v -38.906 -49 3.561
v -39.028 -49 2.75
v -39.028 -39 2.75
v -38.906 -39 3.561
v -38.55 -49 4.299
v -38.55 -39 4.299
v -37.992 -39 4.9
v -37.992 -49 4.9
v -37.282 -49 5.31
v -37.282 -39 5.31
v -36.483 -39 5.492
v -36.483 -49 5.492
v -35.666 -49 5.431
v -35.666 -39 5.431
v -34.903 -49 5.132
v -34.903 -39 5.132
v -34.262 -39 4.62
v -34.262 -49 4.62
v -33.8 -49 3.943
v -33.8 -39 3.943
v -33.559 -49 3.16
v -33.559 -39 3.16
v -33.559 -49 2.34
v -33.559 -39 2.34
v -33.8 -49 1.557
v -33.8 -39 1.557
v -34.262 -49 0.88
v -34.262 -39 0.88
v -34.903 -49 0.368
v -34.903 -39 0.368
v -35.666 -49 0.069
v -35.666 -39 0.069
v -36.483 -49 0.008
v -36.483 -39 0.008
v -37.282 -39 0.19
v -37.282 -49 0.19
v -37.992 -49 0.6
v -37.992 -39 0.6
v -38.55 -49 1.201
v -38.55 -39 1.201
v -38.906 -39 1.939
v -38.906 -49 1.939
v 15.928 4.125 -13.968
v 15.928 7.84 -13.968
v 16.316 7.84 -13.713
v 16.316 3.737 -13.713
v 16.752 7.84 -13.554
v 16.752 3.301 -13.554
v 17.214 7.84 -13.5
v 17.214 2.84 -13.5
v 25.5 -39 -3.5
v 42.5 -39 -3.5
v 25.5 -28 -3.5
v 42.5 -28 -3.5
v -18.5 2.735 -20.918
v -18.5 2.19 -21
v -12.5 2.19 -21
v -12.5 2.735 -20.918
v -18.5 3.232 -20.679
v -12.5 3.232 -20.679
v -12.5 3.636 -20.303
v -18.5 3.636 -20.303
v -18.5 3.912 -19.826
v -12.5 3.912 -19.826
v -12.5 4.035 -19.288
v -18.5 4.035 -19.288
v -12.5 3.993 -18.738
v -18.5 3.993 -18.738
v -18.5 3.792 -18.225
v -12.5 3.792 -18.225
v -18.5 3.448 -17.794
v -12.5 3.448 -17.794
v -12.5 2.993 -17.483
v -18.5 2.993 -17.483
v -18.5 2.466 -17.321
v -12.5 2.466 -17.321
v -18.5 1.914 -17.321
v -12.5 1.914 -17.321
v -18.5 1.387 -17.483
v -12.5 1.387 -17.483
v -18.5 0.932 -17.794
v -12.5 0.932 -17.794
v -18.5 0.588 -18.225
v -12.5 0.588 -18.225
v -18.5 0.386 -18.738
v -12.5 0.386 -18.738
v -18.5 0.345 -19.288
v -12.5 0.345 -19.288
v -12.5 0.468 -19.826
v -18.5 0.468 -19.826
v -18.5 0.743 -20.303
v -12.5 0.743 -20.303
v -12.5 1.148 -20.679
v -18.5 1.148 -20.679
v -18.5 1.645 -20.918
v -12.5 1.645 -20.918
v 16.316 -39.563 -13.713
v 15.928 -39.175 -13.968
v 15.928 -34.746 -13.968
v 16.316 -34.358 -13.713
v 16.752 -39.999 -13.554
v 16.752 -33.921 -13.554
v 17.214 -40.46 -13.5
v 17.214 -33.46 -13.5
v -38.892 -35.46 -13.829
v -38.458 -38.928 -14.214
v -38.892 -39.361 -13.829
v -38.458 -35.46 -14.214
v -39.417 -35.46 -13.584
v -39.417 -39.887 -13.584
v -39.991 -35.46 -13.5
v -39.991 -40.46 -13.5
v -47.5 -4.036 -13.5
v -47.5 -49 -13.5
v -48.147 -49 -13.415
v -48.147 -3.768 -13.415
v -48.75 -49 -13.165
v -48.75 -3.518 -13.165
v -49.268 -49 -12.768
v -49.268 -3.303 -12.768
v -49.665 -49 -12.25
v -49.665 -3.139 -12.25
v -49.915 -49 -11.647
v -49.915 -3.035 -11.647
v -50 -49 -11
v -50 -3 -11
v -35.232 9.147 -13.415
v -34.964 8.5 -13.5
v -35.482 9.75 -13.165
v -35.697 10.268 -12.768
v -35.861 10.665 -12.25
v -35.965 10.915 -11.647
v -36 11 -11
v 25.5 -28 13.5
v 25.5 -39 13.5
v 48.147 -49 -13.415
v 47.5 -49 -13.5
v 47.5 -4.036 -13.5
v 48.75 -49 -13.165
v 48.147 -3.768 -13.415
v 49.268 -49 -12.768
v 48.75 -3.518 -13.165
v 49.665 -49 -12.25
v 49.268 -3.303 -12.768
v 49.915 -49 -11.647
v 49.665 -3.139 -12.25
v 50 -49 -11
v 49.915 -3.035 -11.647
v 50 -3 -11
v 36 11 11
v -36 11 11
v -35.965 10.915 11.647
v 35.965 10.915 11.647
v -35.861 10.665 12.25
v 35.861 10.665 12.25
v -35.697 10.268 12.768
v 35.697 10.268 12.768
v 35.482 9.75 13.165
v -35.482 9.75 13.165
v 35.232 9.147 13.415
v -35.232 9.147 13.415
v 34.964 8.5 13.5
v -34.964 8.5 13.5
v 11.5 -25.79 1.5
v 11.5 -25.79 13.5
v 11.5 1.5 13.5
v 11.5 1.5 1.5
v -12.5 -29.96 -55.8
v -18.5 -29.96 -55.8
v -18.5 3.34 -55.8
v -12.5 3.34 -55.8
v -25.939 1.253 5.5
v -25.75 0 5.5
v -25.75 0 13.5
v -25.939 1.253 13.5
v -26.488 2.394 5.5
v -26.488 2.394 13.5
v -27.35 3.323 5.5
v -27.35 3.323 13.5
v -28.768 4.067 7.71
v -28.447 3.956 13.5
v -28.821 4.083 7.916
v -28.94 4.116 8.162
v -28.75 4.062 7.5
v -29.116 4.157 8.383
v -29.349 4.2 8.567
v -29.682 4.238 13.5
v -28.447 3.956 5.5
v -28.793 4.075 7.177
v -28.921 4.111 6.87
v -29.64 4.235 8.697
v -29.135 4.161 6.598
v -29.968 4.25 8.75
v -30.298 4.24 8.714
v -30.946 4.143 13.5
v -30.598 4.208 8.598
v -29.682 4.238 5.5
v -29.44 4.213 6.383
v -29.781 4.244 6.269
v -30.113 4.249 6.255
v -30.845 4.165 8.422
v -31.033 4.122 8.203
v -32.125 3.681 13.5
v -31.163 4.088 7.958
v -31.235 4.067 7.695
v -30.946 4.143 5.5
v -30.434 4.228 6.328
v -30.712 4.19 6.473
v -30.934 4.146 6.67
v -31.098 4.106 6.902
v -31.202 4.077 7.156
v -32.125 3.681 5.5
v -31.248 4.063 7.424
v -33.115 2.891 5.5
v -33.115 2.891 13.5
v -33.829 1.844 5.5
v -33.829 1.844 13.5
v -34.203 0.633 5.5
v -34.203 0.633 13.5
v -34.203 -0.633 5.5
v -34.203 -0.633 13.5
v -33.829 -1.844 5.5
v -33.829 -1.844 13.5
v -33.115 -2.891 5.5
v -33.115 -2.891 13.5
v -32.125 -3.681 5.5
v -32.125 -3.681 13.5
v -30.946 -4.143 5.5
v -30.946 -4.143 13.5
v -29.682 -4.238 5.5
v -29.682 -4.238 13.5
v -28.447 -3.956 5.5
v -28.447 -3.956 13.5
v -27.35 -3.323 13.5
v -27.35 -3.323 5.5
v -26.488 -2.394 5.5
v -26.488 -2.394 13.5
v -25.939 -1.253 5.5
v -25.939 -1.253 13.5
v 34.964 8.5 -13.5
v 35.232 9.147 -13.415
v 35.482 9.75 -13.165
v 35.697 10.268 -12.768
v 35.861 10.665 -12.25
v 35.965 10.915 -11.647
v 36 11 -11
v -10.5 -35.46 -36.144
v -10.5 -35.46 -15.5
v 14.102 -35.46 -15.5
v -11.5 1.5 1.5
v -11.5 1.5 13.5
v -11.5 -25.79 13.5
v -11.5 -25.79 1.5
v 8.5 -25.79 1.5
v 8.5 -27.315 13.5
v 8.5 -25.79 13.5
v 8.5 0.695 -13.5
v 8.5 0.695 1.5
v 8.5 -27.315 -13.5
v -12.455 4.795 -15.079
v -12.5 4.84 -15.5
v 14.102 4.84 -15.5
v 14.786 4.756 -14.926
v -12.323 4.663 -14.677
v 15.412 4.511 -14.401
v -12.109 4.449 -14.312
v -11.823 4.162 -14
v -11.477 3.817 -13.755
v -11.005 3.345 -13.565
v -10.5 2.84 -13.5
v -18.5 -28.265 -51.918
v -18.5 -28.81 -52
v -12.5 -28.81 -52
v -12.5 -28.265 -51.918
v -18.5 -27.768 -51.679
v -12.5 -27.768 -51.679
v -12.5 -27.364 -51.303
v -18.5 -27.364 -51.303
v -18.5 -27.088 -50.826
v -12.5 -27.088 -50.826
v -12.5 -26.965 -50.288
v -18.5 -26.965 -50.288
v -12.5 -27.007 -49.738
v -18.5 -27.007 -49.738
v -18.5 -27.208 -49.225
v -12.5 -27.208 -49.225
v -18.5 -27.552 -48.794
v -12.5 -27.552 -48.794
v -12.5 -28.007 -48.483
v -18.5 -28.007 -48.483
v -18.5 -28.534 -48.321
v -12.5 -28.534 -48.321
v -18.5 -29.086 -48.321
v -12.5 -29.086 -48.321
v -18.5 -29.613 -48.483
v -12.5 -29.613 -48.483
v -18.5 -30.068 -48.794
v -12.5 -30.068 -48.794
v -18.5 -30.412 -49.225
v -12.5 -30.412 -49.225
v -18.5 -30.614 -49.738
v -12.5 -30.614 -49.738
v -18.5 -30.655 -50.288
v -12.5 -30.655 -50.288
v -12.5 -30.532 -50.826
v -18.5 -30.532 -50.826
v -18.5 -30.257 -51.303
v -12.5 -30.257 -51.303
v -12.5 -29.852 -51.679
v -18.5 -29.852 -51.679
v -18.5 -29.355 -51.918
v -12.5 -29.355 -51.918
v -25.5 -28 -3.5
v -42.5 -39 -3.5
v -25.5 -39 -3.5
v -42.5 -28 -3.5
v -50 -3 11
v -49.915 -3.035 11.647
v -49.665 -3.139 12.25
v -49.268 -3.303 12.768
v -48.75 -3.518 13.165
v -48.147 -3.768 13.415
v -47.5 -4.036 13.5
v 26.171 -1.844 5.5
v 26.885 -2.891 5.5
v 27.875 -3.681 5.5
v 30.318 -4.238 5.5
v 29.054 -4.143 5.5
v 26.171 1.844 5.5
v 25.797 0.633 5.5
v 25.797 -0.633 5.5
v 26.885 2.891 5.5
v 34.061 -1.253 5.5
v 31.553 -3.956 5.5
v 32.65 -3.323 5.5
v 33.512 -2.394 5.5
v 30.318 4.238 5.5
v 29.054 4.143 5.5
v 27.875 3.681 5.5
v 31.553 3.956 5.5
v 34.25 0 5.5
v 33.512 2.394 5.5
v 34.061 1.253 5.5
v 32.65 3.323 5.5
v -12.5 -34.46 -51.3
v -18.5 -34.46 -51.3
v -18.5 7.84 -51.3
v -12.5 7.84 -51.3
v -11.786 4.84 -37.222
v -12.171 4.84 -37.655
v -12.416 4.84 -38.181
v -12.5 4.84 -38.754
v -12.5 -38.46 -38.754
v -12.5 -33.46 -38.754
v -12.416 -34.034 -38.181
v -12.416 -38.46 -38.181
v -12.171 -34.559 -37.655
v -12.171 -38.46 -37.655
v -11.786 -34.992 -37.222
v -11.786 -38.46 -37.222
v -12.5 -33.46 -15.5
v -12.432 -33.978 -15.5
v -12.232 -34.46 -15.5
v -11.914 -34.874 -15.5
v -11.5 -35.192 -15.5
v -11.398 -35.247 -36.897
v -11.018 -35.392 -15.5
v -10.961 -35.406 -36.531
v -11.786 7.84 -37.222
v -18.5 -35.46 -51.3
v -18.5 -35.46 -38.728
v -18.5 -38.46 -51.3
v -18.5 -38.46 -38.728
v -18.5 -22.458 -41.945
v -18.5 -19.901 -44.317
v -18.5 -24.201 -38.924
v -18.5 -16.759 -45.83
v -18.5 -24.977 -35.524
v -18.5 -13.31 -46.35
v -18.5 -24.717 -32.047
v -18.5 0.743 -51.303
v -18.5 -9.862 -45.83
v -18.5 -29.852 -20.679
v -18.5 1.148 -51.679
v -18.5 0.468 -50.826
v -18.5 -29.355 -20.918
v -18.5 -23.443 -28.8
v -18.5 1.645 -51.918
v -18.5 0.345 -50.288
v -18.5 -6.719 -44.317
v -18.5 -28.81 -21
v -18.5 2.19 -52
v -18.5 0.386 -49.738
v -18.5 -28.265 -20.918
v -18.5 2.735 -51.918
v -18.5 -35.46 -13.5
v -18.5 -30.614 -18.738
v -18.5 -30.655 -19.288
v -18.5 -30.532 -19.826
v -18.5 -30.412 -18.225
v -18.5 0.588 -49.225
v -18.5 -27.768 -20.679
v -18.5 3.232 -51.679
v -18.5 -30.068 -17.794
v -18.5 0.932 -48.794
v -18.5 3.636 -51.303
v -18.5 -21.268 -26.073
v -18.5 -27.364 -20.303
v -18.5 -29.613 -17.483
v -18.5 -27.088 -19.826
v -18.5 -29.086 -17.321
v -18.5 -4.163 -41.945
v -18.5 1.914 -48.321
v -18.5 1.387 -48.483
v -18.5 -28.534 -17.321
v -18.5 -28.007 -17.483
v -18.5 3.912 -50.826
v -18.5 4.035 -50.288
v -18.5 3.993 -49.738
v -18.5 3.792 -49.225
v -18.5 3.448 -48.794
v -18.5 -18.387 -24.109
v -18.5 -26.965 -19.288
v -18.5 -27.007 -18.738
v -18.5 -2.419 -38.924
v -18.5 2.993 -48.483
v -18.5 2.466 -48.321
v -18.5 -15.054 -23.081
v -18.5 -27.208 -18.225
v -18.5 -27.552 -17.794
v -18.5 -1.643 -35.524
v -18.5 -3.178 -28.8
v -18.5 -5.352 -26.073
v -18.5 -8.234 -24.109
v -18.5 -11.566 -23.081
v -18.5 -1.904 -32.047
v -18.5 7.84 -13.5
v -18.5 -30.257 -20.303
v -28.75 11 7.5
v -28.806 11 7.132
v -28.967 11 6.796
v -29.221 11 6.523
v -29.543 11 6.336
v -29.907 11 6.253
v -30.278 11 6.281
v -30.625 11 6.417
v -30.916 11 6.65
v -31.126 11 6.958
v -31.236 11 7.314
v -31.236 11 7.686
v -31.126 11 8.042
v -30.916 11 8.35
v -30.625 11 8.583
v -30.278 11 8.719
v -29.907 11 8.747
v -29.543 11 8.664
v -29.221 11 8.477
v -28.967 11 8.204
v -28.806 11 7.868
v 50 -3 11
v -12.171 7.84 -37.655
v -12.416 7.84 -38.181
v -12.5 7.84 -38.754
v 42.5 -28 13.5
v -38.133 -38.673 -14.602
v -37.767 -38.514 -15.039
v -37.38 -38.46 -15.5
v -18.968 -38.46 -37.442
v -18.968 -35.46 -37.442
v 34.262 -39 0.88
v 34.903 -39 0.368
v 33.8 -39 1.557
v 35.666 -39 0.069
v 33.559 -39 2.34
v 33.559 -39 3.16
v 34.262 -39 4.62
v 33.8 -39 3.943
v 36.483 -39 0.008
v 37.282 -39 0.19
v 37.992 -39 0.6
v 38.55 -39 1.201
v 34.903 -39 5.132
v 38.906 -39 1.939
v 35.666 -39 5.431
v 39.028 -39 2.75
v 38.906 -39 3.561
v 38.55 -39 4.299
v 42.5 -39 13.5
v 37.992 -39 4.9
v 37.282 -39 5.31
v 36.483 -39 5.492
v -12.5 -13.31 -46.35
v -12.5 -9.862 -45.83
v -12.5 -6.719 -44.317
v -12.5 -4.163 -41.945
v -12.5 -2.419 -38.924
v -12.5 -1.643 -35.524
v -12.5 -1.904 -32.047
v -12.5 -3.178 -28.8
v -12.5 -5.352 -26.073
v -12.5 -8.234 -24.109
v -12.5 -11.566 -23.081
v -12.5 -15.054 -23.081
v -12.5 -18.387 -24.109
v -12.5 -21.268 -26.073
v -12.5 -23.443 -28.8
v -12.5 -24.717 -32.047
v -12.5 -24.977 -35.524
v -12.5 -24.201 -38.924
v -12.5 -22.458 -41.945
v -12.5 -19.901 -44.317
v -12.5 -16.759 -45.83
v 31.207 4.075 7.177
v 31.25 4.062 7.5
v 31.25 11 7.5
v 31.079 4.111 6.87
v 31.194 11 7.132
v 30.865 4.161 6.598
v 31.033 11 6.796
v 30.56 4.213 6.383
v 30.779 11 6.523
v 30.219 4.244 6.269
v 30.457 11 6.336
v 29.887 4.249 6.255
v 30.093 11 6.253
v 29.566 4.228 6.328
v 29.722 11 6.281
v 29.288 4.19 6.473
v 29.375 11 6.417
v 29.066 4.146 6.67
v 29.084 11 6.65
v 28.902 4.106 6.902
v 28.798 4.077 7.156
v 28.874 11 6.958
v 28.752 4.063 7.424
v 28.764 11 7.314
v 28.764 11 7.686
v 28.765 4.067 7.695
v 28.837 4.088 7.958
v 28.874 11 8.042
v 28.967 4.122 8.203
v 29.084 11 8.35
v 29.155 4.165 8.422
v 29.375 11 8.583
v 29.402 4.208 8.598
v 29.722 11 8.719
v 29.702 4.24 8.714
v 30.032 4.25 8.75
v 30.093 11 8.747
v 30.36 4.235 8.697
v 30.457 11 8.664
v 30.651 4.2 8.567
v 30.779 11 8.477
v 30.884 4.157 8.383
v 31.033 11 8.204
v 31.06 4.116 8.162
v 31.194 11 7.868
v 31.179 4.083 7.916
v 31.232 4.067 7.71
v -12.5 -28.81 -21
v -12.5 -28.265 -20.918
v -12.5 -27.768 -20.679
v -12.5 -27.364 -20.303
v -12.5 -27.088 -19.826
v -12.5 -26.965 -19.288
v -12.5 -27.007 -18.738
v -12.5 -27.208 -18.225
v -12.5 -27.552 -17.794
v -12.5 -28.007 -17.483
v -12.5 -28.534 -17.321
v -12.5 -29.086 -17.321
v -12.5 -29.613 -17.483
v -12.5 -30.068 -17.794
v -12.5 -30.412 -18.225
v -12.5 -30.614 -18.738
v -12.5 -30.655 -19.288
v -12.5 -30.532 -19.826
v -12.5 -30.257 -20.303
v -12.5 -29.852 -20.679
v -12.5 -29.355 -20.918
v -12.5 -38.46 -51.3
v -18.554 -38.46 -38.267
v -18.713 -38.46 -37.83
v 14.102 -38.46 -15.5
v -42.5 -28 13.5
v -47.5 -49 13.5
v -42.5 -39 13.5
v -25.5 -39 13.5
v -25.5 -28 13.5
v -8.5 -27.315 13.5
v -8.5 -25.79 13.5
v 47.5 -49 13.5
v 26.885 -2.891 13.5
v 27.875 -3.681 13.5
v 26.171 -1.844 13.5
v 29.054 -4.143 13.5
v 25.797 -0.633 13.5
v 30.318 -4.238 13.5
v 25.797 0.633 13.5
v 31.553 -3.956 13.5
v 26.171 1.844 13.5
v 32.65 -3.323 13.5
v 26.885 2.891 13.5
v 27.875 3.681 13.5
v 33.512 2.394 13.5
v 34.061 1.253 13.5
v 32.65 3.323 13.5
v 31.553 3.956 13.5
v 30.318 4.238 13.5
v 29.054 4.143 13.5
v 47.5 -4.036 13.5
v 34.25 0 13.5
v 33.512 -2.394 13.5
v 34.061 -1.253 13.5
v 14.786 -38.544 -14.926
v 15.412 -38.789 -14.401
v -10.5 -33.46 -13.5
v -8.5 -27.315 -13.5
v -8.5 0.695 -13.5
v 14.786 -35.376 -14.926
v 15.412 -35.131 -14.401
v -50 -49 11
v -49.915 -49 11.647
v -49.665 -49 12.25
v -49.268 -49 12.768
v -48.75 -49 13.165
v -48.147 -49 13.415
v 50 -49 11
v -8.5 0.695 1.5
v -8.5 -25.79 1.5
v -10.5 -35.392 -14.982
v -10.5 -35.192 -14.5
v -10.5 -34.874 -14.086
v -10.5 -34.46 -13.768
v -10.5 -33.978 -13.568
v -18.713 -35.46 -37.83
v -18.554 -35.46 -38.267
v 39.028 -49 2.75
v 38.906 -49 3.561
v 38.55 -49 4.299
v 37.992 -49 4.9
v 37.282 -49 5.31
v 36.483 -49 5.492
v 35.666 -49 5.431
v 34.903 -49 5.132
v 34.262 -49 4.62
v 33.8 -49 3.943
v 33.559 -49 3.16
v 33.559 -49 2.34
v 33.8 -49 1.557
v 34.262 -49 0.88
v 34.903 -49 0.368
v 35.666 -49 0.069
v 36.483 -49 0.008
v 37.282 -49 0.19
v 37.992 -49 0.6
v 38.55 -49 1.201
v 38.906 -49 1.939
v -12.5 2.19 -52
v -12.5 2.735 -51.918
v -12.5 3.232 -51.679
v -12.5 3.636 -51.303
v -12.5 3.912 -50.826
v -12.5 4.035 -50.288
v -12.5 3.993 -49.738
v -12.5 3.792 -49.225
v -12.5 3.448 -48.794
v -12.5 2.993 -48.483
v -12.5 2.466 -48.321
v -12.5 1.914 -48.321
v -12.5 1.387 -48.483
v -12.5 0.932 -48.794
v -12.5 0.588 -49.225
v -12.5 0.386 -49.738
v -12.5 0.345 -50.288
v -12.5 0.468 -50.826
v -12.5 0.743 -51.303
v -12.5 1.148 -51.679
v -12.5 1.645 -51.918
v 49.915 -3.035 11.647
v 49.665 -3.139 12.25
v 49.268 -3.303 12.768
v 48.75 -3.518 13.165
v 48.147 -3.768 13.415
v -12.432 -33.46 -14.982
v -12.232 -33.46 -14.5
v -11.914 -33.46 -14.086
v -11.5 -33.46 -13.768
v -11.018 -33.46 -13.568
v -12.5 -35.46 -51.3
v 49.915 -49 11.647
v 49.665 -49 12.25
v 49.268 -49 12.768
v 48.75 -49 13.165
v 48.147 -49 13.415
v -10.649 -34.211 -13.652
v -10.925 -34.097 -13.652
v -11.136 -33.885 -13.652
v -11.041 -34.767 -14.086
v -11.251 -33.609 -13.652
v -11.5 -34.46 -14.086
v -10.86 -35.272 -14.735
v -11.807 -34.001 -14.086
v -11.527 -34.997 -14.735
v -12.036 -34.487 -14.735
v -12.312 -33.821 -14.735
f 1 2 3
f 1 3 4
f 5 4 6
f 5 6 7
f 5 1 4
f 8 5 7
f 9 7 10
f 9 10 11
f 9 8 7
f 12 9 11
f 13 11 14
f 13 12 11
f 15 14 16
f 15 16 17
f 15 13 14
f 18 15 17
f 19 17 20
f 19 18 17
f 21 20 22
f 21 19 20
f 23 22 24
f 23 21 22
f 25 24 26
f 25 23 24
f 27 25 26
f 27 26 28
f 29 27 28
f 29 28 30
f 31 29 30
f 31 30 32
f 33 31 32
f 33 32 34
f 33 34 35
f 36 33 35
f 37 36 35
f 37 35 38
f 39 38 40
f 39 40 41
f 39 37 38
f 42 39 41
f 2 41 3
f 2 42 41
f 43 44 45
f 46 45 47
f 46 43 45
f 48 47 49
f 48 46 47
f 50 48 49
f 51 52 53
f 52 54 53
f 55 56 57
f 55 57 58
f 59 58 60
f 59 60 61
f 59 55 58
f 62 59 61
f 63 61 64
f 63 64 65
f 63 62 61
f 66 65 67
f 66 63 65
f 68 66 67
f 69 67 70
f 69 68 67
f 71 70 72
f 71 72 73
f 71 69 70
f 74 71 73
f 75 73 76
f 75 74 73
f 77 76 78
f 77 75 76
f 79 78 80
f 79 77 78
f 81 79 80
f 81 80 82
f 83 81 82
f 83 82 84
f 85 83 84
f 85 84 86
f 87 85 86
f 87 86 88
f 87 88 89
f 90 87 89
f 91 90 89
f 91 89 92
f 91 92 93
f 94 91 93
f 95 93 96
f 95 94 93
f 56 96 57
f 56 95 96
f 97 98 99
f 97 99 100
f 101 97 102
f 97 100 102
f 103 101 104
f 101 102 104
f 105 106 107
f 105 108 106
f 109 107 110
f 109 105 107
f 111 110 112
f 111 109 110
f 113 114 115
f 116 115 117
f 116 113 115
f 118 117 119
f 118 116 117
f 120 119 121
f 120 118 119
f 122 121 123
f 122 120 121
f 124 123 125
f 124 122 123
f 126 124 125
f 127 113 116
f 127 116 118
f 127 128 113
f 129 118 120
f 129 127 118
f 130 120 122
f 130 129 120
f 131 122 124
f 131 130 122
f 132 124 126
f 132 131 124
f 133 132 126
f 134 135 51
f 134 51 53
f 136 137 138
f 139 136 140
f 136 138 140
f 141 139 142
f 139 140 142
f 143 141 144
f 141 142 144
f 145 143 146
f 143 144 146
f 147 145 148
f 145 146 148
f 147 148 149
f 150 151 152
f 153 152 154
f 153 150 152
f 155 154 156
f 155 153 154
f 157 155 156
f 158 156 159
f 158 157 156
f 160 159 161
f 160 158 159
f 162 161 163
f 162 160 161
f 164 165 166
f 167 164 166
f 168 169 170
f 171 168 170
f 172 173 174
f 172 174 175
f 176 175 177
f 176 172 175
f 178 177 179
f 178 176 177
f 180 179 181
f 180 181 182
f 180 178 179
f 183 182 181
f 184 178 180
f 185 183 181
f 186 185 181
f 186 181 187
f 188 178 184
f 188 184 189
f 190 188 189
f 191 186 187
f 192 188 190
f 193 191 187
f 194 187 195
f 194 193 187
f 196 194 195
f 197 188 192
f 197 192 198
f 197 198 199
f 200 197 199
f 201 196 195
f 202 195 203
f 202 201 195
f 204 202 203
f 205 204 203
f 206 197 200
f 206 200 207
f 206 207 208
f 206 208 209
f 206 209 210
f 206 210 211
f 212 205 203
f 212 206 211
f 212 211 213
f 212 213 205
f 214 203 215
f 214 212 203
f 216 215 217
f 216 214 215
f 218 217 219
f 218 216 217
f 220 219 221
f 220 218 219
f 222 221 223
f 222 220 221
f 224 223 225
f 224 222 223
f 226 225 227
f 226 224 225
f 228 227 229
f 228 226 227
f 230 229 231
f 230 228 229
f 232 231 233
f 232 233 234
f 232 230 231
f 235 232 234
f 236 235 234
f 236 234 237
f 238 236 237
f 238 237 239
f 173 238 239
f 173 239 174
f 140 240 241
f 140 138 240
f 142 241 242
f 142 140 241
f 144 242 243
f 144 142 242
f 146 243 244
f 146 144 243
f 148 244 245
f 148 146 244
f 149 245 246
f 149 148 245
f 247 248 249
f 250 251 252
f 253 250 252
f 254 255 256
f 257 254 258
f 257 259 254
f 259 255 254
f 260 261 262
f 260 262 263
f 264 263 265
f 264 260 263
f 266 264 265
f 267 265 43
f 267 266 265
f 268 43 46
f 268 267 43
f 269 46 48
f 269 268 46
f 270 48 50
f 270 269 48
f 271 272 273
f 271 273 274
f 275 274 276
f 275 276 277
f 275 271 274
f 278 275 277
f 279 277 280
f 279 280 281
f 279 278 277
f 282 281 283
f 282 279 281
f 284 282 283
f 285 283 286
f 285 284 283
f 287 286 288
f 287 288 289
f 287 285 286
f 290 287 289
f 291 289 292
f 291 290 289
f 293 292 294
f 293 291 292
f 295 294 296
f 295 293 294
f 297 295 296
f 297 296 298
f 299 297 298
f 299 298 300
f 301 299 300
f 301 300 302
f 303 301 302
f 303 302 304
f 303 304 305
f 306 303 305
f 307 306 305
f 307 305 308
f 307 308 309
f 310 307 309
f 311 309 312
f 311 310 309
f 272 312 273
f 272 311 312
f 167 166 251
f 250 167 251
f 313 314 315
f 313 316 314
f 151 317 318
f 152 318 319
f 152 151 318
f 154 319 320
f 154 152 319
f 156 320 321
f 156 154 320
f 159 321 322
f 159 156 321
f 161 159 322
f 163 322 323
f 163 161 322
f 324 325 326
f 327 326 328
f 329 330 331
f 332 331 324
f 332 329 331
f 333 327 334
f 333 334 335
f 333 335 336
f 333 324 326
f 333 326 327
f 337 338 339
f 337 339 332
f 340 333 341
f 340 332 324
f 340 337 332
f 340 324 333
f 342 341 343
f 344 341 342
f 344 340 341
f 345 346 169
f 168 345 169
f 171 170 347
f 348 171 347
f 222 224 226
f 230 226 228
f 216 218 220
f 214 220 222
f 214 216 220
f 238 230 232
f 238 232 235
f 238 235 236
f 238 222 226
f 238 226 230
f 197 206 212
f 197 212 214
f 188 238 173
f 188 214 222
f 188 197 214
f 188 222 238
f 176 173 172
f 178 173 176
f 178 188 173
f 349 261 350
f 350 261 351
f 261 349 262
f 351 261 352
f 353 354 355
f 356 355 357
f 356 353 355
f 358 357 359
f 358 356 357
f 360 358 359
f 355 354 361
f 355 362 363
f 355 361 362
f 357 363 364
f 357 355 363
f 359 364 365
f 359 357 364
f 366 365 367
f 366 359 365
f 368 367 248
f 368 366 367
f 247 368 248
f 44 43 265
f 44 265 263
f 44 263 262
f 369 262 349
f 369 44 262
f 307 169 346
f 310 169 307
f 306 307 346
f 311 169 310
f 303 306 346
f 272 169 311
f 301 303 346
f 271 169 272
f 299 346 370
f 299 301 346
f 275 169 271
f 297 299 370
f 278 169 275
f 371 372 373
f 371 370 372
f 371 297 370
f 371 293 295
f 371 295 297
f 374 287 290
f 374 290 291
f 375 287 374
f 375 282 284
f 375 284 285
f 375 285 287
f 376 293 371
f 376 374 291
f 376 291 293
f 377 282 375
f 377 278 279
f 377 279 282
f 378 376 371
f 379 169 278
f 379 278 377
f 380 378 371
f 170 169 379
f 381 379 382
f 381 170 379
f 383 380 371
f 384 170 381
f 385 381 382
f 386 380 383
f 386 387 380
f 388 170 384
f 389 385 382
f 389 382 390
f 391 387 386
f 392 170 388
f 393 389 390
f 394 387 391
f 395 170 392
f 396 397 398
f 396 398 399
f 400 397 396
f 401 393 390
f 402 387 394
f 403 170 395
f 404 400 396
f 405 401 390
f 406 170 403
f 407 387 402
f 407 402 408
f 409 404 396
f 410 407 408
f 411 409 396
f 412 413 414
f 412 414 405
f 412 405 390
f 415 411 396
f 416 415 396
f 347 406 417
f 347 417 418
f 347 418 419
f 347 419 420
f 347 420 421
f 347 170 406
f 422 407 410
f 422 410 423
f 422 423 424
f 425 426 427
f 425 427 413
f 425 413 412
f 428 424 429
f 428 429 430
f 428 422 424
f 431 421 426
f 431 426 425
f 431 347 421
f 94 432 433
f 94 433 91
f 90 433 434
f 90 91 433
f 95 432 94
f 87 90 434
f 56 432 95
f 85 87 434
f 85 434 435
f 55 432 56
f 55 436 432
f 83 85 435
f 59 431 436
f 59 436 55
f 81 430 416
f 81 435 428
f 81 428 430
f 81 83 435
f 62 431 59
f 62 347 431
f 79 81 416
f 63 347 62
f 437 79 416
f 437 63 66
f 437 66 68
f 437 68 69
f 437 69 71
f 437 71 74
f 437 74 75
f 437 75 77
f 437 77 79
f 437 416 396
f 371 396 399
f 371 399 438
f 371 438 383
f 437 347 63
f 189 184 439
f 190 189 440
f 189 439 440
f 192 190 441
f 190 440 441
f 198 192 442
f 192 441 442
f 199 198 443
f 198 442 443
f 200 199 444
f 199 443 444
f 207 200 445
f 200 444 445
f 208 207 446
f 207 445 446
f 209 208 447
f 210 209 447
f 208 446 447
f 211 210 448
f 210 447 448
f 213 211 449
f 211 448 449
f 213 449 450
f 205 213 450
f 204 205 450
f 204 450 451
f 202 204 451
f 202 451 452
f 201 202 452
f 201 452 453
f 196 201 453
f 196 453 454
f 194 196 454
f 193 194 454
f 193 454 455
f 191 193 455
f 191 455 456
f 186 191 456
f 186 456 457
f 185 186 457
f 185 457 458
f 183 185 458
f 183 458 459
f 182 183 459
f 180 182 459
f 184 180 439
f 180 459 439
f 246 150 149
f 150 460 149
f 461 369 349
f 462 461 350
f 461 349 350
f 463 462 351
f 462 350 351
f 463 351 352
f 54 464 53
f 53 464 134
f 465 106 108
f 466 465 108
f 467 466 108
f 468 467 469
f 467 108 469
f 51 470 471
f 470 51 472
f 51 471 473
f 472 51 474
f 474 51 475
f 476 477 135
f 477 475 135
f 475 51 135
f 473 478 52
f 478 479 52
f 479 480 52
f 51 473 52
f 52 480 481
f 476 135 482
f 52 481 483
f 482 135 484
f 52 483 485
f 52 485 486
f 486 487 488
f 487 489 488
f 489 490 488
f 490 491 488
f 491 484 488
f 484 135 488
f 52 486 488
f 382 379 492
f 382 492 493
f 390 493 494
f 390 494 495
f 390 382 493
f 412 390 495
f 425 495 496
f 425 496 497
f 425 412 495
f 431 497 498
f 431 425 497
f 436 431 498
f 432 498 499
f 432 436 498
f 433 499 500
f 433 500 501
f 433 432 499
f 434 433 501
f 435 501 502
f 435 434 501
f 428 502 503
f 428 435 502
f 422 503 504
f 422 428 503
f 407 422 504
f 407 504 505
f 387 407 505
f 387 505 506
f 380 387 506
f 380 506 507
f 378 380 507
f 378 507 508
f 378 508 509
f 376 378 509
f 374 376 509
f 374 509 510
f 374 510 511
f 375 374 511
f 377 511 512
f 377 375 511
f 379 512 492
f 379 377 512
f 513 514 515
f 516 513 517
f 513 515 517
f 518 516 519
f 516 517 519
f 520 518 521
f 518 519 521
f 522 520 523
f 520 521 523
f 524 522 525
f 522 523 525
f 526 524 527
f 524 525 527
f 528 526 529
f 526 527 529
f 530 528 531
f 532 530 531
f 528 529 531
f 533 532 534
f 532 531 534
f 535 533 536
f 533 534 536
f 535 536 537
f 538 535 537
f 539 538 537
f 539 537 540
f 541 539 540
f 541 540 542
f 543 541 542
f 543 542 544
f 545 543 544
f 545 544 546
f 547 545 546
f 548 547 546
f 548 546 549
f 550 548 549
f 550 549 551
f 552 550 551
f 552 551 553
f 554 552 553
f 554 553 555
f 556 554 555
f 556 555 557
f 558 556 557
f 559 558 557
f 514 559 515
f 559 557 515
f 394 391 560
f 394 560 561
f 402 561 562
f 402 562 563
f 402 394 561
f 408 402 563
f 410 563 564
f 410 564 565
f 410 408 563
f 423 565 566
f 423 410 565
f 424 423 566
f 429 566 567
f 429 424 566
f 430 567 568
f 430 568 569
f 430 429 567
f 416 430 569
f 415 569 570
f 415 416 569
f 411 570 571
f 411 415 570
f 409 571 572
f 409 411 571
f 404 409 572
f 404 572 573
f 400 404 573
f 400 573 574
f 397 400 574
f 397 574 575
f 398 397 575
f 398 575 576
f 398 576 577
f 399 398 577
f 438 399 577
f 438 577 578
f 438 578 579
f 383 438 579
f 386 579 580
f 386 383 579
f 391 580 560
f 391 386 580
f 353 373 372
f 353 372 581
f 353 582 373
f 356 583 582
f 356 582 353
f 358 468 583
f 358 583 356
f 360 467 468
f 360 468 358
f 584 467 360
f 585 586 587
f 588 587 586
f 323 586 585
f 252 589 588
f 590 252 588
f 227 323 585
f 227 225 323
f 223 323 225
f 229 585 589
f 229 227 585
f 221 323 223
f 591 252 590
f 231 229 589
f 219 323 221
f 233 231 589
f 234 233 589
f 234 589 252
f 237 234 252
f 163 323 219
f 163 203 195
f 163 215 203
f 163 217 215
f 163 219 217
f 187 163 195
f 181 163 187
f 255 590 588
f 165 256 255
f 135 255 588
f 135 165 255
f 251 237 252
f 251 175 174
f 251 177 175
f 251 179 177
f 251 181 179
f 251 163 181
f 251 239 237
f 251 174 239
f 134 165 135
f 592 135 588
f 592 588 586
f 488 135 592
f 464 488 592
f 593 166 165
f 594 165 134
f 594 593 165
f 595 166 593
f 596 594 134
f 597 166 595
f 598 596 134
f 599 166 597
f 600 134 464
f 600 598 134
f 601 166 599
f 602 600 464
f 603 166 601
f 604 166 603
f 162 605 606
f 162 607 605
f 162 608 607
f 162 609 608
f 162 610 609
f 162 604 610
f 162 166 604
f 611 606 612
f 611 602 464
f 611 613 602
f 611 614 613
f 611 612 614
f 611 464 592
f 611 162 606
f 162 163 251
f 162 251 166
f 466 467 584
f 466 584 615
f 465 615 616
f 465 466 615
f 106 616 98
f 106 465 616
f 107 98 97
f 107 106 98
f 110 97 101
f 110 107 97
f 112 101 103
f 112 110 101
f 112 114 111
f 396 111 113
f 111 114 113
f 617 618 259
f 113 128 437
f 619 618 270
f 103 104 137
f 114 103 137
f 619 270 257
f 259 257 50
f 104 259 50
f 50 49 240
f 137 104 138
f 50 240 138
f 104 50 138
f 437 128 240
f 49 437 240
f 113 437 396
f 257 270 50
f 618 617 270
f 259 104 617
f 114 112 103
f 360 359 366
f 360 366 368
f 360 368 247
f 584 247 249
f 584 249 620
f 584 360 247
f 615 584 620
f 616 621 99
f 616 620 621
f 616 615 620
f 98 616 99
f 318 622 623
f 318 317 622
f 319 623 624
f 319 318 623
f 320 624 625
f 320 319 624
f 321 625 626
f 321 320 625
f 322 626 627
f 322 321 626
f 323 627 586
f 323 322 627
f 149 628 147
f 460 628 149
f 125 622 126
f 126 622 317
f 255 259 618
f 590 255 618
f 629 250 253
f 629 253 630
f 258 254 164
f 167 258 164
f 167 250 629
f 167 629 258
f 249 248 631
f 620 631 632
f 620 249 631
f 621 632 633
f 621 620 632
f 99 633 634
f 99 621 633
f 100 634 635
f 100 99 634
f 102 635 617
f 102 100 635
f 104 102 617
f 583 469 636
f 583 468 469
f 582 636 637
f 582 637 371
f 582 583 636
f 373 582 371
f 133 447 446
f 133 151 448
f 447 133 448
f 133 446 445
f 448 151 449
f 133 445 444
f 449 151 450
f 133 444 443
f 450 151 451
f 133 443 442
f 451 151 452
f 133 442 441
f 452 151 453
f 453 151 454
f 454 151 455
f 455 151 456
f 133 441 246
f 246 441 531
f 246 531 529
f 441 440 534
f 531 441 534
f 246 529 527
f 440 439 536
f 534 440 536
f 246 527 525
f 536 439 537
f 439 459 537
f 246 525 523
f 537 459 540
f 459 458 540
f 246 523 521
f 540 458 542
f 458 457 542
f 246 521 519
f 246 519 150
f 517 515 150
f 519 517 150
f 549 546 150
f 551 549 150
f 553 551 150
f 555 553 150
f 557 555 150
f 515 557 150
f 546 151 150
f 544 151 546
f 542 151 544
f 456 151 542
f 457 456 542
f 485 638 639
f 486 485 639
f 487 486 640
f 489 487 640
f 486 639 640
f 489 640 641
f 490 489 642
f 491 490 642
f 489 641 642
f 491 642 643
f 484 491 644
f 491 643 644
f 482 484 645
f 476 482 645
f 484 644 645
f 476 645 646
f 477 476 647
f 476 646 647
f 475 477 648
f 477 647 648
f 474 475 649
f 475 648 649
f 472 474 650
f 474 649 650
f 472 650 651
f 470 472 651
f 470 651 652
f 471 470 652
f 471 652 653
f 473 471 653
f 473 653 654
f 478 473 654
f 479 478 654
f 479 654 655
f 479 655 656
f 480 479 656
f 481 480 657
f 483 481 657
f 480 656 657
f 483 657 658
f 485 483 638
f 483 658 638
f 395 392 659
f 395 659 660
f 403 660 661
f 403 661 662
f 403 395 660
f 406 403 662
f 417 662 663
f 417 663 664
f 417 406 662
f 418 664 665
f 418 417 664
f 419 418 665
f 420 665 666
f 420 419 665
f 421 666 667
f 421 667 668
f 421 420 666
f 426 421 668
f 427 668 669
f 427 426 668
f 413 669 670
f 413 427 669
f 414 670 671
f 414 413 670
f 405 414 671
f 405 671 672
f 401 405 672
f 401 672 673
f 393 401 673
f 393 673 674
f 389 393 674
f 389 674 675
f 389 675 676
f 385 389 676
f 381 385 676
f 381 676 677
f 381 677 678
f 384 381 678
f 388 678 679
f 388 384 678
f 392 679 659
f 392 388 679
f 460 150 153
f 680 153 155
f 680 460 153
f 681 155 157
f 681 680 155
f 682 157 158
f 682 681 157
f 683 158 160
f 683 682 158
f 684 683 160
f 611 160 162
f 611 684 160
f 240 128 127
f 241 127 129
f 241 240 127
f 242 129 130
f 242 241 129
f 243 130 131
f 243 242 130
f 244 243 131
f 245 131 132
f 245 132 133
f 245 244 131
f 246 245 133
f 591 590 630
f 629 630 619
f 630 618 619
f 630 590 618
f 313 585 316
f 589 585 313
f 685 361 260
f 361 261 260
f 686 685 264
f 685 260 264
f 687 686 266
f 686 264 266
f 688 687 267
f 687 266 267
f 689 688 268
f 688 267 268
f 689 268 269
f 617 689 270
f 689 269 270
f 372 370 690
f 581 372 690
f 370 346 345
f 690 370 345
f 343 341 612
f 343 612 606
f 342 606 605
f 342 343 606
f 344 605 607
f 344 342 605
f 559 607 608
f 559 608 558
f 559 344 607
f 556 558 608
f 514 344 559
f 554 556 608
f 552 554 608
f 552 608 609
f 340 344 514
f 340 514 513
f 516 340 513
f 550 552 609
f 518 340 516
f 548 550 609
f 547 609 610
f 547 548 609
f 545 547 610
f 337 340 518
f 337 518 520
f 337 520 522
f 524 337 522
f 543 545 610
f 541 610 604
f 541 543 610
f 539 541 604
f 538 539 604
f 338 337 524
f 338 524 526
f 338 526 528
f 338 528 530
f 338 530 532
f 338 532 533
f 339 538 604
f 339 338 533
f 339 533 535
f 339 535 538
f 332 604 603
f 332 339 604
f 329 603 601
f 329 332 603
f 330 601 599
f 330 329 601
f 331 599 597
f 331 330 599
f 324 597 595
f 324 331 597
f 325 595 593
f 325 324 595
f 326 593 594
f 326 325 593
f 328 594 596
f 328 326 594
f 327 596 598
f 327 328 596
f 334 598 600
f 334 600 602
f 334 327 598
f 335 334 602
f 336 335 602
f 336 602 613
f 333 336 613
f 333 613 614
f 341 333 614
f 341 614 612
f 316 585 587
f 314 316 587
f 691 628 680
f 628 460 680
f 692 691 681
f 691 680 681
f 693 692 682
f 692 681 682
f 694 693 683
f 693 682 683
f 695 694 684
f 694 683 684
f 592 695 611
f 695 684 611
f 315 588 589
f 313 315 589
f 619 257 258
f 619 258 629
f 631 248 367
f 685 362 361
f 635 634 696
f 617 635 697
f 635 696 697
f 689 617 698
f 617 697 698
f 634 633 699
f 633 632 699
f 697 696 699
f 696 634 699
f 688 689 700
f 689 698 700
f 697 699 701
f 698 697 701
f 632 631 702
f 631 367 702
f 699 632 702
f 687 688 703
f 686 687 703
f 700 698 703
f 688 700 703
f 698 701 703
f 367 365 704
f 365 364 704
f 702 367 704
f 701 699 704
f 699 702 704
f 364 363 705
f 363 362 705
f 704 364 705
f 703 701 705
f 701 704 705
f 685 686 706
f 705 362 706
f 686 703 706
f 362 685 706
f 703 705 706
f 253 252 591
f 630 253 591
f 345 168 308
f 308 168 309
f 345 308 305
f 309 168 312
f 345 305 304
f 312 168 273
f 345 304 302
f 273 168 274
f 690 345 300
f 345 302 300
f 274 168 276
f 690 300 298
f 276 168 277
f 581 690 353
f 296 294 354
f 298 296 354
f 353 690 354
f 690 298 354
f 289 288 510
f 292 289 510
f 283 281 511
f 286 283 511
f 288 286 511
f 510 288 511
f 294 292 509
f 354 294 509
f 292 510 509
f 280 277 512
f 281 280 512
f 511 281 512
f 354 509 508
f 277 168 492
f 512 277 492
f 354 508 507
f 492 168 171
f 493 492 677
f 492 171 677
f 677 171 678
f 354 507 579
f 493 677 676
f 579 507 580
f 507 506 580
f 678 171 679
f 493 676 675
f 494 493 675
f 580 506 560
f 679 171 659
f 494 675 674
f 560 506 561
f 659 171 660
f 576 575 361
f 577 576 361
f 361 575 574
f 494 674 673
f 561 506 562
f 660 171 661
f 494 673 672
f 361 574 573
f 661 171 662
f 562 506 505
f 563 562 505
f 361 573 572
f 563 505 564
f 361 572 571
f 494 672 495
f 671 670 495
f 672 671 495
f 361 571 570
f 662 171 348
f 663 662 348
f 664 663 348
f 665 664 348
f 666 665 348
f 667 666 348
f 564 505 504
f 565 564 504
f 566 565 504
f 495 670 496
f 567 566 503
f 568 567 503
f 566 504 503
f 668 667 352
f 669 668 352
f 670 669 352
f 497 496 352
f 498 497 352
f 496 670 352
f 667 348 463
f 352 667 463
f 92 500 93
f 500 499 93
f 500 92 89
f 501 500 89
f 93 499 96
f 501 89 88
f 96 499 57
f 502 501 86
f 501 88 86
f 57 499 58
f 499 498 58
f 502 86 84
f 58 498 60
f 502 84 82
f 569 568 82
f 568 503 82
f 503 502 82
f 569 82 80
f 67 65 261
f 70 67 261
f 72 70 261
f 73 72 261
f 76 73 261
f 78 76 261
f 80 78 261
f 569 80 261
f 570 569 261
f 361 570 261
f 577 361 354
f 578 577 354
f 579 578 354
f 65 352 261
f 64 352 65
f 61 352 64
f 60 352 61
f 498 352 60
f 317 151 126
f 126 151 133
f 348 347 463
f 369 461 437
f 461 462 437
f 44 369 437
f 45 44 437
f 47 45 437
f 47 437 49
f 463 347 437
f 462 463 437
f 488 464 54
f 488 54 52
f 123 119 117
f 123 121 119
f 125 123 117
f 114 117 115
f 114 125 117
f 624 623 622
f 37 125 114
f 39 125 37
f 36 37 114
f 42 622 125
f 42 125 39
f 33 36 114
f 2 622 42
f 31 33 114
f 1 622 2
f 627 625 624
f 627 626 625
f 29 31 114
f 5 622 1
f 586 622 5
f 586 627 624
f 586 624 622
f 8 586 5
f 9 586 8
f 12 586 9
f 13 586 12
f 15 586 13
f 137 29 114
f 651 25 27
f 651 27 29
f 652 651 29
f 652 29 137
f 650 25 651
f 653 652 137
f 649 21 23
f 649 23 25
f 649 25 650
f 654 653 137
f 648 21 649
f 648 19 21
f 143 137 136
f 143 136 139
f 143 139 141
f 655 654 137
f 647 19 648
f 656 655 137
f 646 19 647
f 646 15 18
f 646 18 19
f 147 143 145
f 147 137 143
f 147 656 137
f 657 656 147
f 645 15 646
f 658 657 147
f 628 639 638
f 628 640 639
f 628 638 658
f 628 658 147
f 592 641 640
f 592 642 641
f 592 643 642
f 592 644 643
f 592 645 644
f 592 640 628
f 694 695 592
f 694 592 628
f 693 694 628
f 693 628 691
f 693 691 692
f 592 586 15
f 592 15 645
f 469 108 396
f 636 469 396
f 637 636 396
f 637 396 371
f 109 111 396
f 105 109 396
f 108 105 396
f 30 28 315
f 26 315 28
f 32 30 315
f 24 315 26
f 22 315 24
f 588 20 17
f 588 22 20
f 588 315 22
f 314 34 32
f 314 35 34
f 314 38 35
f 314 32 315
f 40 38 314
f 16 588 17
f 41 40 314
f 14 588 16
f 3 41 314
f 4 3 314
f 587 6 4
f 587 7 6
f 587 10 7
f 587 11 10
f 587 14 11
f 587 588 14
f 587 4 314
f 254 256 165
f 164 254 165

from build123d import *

# Parameters (mm, degrees)
SKETCH1_W            = 100
SKETCH1_H            = 60
SKETCH1_R            = 4.25
BOSS_EXTRUDE1_DEPTH  = 13.5
SKETCH2_R            = 7
BOSS_EXTRUDE2_DEPTH  = 10
CHAMFER1_SIZE        = 14
FILLET1_R            = 2.5
CUT_EXTRUDE1_DEPTH   = 12
SKETCH5_R            = 1.25
CUT_EXTRUDE2_DEPTH   = 12
SKETCH6_R            = 2.75
CUT_EXTRUDE3_DEPTH   = 10
CUT_EXTRUDE4_DEPTH   = 17
SKETCH11_W           = 17
SKETCH11_H           = 28.01
CUT_EXTRUDE5_DEPTH   = 28.0000001
SKETCH13_R           = 4.25
BOSS_EXTRUDE6_DEPTH  = 9
SKETCH14_R           = 1.85
SKETCH14_R_2         = 11.7
BOSS_EXTRUDE7_DEPTH  = 6
BOSS_EXTRUDE8_START  = 4
BOSS_EXTRUDE8_DEPTH  = 3
SKETCH17_W           = 6
SKETCH17_H           = 42.718705864
BOSS_EXTRUDE9_DEPTH  = 1
BOSS_EXTRUDE12_DEPTH = 3
SKETCH19_W           = 6
SKETCH19_H           = 24.5
BOSS_EXTRUDE13_DEPTH = 6
SKETCH21_W           = 6
SKETCH21_H           = 21.281155669
BOSS_EXTRUDE14_DEPTH = 3
BOSS_EXTRUDE15_DEPTH = 3
FILLET3_R            = 2


with BuildPart() as part:
    # Sketch1 → Boss-Extrude1 (new body, symmetric)
    with BuildSketch(Plane.XY):
        with Locations((0, -19)):
            Rectangle(SKETCH1_W, SKETCH1_H)
        with Locations((30, 0)):
            Circle(SKETCH1_R, mode=Mode.SUBTRACT)
        with Locations((-30, 0)):
            Circle(SKETCH1_R, mode=Mode.SUBTRACT)
    extrude(amount=BOSS_EXTRUDE1_DEPTH, both=True)

    # Sketch2 → Boss-Extrude2 (add)
    with BuildSketch(Plane(origin=(0, 0, -13.5), x_dir=(-1, 0, 0), z_dir=(0, 0, -1))):
        with Locations((-30, 0)):
            Circle(SKETCH2_R)
        with Locations((30, 0)):
            Circle(SKETCH2_R)
    extrude(amount=-BOSS_EXTRUDE2_DEPTH)

    # Chamfer1
    chamfer1_edges = [part.edges().sort_by_distance(p)[0] for p in [
        (-50, 11, 0),
        (50, 11, 0),
    ]]
    chamfer(chamfer1_edges, length=CHAMFER1_SIZE)

    # Fillet1
    fillet1_edges = [part.edges().sort_by_distance(p)[0] for p in [
        (-50, -26, -13.5),
        (-50, -26, 13.5),
        (0, 11, -13.5),
        (43, 4, -13.5),
        (-43, 4, -13.5),
        (0, 11, 13.5),
        (50, -26, 13.5),
        (43, 4, 13.5),
        (-43, 4, 13.5),
        (50, -26, -13.5),
    ]]
    fillet(fillet1_edges, radius=FILLET1_R)

    # Sketch3 → Cut-Extrude1 (cut)
    with BuildSketch(Plane.XY.offset(13.5)):
        Polygon((11.5, 1.5), (-11.5, 1.5), (-11.5, -14.75), (-11.5, -25.79), (11.5, -25.79), (11.5, -14.75), align=None)
    extrude(amount=-CUT_EXTRUDE1_DEPTH, mode=Mode.SUBTRACT)

    # Sketch5 → Cut-Extrude2 (cut)
    with BuildSketch(Plane(origin=(0, 11, 0), x_dir=(1, 0, 0), z_dir=(0, 1, 0))):
        with Locations((30, -7.5)):
            Circle(SKETCH5_R)
        with Locations((-30, -7.5)):
            Circle(SKETCH5_R)
    extrude(amount=-CUT_EXTRUDE2_DEPTH, mode=Mode.SUBTRACT)

    # Sketch6 → Cut-Extrude3 (cut)
    with BuildSketch(Plane.XZ.offset(49)):
        with Locations((36.277796695, 2.75)):
            Circle(SKETCH6_R)
    cut_extrude3 = extrude(amount=-CUT_EXTRUDE3_DEPTH, mode=Mode.SUBTRACT)

    # Sketch7 → Cut-Extrude4 (cut)
    with BuildSketch(Plane.XY.offset(13.5)):
        Polygon((42.5, -39), (30.5, -39), (25.5, -39), (25.5, -28), (30.5, -28), (42.5, -28), align=None)
    cut_extrude4 = extrude(amount=-CUT_EXTRUDE4_DEPTH, mode=Mode.SUBTRACT)

    # Mirror1: Cut-Extrude3, Cut-Extrude4 across plane
    add(cut_extrude3.mirror(Plane(origin=(0, 0, 0), x_dir=(0, 0, 1), z_dir=(1, 0, 0))), mode=Mode.SUBTRACT)
    add(cut_extrude4.mirror(Plane(origin=(0, 0, 0), x_dir=(0, 0, 1), z_dir=(1, 0, 0))), mode=Mode.SUBTRACT)

    # Sketch11 → Cut-Extrude5 (cut, through all)
    with BuildSketch(Plane(origin=(0, 0, -13.5), x_dir=(-1, 0, 0), z_dir=(0, 0, -1))):
        with Locations((0, -13.310174912)):
            Rectangle(SKETCH11_W, SKETCH11_H)
    extrude(amount=-CUT_EXTRUDE5_DEPTH, mode=Mode.SUBTRACT)

    # Sketch13 → Boss-Extrude6 (add)
    with BuildSketch(Plane.XY.offset(-3.5)):
        with Locations((30, 0)):
            Circle(SKETCH13_R)
        with Locations((-30, 0)):
            Circle(SKETCH13_R)
    extrude(amount=BOSS_EXTRUDE6_DEPTH)

    # Sketch14 → Boss-Extrude7 (add)
    with BuildSketch(Plane(origin=(-18.5, 0, 0), x_dir=(0, 0, -1), z_dir=(1, 0, 0))):
        Polygon((55.8, -29.960174912), (55.8, 3.339825088), (51.3, 7.839825088), (18, 7.839825088), (11, 7.839825088), (11, -34.460174912), (18, -34.460174912), (51.3, -34.460174912), align=None)
        with Locations((50.15, -28.810174912)):
            Circle(SKETCH14_R, mode=Mode.SUBTRACT)
        with Locations((50.15, 2.189825088)):
            Circle(SKETCH14_R, mode=Mode.SUBTRACT)
        with Locations((19.15, 2.189825088)):
            Circle(SKETCH14_R, mode=Mode.SUBTRACT)
        with Locations((19.15, -28.810174912)):
            Circle(SKETCH14_R, mode=Mode.SUBTRACT)
        with Locations((34.65, -13.310174912)):
            Circle(SKETCH14_R_2, mode=Mode.SUBTRACT)
    extrude(amount=BOSS_EXTRUDE7_DEPTH)

    # Sketch15 → Boss-Extrude8 (add)
    with BuildSketch(Plane.XZ.offset(34.460174912).offset(BOSS_EXTRUDE8_START)):
        Polygon((-14.5, -39.5), (20.060854185, -10.5), (-14.5, -10.5), align=None)
    extrude(amount=-BOSS_EXTRUDE8_DEPTH)

    # Sketch17 → Boss-Extrude9 (add)
    with BuildSketch(Plane.XZ.offset(34.460174912)):
        with Locations((-15.5, -29.940647068)):
            Rectangle(SKETCH17_W, SKETCH17_H)
    extrude(amount=BOSS_EXTRUDE9_DEPTH)

    # Sketch18 → Boss-Extrude12 (add)
    with BuildSketch(Plane.XZ.offset(35.460174912)):
        Polygon((-18.5, -10.5), (-41.575239857, -10.5), (-18.5, -38), (-13.739171521, -38), (-13.739171521, -10.5), align=None)
    extrude(amount=BOSS_EXTRUDE12_DEPTH)

    # Sketch19 → Boss-Extrude13 (add)
    with BuildSketch(Plane.XZ.offset(38.460174912)):
        with Locations((-15.5, -25.75)):
            Rectangle(SKETCH19_W, SKETCH19_H)
    extrude(amount=-BOSS_EXTRUDE13_DEPTH)

    # Sketch21 → Boss-Extrude14 (add)
    with BuildSketch(Plane.XZ.offset(35.460174912)):
        with Locations((-15.5, -40.659422166)):
            Rectangle(SKETCH21_W, SKETCH21_H)
    extrude(amount=BOSS_EXTRUDE14_DEPTH)

    # Sketch22 → Boss-Extrude15 (add)
    with BuildSketch(Plane(origin=(0, 7.839825088, 0), x_dir=(1, 0, 0), z_dir=(0, 1, 0))):
        Polygon((-12.5, 37.821800738), (-15.5, 37.821800738), (-15.5, 11), (-12.5, 11), (16.485593407, 11), (16.485593407, 13.5), align=None)
    extrude(amount=-BOSS_EXTRUDE15_DEPTH)

    # Fillet3
    fillet3_edges = [part.edges().sort_by_distance(p)[0] for p in [
        (-12.5, 6.339825088, -37.821800738),
        (-39.057940964, -36.960174912, -13.5),
        (-18.5, -36.960174912, -38),
        (16.485593407, 6.339825088, -13.5),
        (16.485593407, -36.960174912, -13.5),
        (-12.5, -36.960174912, -37.821800738),
        (-11.286173778, -38.460174912, -13.5),
        (-12.5, -35.460174912, -25.660900369),
        (1.992796704, -35.460174912, -13.5),
        (-12.5, -15.310174912, -13.5),
        (1.992796704, 4.839825088, -13.5),
    ]]
    fillet(fillet3_edges, radius=FILLET3_R)


solid = part.part
